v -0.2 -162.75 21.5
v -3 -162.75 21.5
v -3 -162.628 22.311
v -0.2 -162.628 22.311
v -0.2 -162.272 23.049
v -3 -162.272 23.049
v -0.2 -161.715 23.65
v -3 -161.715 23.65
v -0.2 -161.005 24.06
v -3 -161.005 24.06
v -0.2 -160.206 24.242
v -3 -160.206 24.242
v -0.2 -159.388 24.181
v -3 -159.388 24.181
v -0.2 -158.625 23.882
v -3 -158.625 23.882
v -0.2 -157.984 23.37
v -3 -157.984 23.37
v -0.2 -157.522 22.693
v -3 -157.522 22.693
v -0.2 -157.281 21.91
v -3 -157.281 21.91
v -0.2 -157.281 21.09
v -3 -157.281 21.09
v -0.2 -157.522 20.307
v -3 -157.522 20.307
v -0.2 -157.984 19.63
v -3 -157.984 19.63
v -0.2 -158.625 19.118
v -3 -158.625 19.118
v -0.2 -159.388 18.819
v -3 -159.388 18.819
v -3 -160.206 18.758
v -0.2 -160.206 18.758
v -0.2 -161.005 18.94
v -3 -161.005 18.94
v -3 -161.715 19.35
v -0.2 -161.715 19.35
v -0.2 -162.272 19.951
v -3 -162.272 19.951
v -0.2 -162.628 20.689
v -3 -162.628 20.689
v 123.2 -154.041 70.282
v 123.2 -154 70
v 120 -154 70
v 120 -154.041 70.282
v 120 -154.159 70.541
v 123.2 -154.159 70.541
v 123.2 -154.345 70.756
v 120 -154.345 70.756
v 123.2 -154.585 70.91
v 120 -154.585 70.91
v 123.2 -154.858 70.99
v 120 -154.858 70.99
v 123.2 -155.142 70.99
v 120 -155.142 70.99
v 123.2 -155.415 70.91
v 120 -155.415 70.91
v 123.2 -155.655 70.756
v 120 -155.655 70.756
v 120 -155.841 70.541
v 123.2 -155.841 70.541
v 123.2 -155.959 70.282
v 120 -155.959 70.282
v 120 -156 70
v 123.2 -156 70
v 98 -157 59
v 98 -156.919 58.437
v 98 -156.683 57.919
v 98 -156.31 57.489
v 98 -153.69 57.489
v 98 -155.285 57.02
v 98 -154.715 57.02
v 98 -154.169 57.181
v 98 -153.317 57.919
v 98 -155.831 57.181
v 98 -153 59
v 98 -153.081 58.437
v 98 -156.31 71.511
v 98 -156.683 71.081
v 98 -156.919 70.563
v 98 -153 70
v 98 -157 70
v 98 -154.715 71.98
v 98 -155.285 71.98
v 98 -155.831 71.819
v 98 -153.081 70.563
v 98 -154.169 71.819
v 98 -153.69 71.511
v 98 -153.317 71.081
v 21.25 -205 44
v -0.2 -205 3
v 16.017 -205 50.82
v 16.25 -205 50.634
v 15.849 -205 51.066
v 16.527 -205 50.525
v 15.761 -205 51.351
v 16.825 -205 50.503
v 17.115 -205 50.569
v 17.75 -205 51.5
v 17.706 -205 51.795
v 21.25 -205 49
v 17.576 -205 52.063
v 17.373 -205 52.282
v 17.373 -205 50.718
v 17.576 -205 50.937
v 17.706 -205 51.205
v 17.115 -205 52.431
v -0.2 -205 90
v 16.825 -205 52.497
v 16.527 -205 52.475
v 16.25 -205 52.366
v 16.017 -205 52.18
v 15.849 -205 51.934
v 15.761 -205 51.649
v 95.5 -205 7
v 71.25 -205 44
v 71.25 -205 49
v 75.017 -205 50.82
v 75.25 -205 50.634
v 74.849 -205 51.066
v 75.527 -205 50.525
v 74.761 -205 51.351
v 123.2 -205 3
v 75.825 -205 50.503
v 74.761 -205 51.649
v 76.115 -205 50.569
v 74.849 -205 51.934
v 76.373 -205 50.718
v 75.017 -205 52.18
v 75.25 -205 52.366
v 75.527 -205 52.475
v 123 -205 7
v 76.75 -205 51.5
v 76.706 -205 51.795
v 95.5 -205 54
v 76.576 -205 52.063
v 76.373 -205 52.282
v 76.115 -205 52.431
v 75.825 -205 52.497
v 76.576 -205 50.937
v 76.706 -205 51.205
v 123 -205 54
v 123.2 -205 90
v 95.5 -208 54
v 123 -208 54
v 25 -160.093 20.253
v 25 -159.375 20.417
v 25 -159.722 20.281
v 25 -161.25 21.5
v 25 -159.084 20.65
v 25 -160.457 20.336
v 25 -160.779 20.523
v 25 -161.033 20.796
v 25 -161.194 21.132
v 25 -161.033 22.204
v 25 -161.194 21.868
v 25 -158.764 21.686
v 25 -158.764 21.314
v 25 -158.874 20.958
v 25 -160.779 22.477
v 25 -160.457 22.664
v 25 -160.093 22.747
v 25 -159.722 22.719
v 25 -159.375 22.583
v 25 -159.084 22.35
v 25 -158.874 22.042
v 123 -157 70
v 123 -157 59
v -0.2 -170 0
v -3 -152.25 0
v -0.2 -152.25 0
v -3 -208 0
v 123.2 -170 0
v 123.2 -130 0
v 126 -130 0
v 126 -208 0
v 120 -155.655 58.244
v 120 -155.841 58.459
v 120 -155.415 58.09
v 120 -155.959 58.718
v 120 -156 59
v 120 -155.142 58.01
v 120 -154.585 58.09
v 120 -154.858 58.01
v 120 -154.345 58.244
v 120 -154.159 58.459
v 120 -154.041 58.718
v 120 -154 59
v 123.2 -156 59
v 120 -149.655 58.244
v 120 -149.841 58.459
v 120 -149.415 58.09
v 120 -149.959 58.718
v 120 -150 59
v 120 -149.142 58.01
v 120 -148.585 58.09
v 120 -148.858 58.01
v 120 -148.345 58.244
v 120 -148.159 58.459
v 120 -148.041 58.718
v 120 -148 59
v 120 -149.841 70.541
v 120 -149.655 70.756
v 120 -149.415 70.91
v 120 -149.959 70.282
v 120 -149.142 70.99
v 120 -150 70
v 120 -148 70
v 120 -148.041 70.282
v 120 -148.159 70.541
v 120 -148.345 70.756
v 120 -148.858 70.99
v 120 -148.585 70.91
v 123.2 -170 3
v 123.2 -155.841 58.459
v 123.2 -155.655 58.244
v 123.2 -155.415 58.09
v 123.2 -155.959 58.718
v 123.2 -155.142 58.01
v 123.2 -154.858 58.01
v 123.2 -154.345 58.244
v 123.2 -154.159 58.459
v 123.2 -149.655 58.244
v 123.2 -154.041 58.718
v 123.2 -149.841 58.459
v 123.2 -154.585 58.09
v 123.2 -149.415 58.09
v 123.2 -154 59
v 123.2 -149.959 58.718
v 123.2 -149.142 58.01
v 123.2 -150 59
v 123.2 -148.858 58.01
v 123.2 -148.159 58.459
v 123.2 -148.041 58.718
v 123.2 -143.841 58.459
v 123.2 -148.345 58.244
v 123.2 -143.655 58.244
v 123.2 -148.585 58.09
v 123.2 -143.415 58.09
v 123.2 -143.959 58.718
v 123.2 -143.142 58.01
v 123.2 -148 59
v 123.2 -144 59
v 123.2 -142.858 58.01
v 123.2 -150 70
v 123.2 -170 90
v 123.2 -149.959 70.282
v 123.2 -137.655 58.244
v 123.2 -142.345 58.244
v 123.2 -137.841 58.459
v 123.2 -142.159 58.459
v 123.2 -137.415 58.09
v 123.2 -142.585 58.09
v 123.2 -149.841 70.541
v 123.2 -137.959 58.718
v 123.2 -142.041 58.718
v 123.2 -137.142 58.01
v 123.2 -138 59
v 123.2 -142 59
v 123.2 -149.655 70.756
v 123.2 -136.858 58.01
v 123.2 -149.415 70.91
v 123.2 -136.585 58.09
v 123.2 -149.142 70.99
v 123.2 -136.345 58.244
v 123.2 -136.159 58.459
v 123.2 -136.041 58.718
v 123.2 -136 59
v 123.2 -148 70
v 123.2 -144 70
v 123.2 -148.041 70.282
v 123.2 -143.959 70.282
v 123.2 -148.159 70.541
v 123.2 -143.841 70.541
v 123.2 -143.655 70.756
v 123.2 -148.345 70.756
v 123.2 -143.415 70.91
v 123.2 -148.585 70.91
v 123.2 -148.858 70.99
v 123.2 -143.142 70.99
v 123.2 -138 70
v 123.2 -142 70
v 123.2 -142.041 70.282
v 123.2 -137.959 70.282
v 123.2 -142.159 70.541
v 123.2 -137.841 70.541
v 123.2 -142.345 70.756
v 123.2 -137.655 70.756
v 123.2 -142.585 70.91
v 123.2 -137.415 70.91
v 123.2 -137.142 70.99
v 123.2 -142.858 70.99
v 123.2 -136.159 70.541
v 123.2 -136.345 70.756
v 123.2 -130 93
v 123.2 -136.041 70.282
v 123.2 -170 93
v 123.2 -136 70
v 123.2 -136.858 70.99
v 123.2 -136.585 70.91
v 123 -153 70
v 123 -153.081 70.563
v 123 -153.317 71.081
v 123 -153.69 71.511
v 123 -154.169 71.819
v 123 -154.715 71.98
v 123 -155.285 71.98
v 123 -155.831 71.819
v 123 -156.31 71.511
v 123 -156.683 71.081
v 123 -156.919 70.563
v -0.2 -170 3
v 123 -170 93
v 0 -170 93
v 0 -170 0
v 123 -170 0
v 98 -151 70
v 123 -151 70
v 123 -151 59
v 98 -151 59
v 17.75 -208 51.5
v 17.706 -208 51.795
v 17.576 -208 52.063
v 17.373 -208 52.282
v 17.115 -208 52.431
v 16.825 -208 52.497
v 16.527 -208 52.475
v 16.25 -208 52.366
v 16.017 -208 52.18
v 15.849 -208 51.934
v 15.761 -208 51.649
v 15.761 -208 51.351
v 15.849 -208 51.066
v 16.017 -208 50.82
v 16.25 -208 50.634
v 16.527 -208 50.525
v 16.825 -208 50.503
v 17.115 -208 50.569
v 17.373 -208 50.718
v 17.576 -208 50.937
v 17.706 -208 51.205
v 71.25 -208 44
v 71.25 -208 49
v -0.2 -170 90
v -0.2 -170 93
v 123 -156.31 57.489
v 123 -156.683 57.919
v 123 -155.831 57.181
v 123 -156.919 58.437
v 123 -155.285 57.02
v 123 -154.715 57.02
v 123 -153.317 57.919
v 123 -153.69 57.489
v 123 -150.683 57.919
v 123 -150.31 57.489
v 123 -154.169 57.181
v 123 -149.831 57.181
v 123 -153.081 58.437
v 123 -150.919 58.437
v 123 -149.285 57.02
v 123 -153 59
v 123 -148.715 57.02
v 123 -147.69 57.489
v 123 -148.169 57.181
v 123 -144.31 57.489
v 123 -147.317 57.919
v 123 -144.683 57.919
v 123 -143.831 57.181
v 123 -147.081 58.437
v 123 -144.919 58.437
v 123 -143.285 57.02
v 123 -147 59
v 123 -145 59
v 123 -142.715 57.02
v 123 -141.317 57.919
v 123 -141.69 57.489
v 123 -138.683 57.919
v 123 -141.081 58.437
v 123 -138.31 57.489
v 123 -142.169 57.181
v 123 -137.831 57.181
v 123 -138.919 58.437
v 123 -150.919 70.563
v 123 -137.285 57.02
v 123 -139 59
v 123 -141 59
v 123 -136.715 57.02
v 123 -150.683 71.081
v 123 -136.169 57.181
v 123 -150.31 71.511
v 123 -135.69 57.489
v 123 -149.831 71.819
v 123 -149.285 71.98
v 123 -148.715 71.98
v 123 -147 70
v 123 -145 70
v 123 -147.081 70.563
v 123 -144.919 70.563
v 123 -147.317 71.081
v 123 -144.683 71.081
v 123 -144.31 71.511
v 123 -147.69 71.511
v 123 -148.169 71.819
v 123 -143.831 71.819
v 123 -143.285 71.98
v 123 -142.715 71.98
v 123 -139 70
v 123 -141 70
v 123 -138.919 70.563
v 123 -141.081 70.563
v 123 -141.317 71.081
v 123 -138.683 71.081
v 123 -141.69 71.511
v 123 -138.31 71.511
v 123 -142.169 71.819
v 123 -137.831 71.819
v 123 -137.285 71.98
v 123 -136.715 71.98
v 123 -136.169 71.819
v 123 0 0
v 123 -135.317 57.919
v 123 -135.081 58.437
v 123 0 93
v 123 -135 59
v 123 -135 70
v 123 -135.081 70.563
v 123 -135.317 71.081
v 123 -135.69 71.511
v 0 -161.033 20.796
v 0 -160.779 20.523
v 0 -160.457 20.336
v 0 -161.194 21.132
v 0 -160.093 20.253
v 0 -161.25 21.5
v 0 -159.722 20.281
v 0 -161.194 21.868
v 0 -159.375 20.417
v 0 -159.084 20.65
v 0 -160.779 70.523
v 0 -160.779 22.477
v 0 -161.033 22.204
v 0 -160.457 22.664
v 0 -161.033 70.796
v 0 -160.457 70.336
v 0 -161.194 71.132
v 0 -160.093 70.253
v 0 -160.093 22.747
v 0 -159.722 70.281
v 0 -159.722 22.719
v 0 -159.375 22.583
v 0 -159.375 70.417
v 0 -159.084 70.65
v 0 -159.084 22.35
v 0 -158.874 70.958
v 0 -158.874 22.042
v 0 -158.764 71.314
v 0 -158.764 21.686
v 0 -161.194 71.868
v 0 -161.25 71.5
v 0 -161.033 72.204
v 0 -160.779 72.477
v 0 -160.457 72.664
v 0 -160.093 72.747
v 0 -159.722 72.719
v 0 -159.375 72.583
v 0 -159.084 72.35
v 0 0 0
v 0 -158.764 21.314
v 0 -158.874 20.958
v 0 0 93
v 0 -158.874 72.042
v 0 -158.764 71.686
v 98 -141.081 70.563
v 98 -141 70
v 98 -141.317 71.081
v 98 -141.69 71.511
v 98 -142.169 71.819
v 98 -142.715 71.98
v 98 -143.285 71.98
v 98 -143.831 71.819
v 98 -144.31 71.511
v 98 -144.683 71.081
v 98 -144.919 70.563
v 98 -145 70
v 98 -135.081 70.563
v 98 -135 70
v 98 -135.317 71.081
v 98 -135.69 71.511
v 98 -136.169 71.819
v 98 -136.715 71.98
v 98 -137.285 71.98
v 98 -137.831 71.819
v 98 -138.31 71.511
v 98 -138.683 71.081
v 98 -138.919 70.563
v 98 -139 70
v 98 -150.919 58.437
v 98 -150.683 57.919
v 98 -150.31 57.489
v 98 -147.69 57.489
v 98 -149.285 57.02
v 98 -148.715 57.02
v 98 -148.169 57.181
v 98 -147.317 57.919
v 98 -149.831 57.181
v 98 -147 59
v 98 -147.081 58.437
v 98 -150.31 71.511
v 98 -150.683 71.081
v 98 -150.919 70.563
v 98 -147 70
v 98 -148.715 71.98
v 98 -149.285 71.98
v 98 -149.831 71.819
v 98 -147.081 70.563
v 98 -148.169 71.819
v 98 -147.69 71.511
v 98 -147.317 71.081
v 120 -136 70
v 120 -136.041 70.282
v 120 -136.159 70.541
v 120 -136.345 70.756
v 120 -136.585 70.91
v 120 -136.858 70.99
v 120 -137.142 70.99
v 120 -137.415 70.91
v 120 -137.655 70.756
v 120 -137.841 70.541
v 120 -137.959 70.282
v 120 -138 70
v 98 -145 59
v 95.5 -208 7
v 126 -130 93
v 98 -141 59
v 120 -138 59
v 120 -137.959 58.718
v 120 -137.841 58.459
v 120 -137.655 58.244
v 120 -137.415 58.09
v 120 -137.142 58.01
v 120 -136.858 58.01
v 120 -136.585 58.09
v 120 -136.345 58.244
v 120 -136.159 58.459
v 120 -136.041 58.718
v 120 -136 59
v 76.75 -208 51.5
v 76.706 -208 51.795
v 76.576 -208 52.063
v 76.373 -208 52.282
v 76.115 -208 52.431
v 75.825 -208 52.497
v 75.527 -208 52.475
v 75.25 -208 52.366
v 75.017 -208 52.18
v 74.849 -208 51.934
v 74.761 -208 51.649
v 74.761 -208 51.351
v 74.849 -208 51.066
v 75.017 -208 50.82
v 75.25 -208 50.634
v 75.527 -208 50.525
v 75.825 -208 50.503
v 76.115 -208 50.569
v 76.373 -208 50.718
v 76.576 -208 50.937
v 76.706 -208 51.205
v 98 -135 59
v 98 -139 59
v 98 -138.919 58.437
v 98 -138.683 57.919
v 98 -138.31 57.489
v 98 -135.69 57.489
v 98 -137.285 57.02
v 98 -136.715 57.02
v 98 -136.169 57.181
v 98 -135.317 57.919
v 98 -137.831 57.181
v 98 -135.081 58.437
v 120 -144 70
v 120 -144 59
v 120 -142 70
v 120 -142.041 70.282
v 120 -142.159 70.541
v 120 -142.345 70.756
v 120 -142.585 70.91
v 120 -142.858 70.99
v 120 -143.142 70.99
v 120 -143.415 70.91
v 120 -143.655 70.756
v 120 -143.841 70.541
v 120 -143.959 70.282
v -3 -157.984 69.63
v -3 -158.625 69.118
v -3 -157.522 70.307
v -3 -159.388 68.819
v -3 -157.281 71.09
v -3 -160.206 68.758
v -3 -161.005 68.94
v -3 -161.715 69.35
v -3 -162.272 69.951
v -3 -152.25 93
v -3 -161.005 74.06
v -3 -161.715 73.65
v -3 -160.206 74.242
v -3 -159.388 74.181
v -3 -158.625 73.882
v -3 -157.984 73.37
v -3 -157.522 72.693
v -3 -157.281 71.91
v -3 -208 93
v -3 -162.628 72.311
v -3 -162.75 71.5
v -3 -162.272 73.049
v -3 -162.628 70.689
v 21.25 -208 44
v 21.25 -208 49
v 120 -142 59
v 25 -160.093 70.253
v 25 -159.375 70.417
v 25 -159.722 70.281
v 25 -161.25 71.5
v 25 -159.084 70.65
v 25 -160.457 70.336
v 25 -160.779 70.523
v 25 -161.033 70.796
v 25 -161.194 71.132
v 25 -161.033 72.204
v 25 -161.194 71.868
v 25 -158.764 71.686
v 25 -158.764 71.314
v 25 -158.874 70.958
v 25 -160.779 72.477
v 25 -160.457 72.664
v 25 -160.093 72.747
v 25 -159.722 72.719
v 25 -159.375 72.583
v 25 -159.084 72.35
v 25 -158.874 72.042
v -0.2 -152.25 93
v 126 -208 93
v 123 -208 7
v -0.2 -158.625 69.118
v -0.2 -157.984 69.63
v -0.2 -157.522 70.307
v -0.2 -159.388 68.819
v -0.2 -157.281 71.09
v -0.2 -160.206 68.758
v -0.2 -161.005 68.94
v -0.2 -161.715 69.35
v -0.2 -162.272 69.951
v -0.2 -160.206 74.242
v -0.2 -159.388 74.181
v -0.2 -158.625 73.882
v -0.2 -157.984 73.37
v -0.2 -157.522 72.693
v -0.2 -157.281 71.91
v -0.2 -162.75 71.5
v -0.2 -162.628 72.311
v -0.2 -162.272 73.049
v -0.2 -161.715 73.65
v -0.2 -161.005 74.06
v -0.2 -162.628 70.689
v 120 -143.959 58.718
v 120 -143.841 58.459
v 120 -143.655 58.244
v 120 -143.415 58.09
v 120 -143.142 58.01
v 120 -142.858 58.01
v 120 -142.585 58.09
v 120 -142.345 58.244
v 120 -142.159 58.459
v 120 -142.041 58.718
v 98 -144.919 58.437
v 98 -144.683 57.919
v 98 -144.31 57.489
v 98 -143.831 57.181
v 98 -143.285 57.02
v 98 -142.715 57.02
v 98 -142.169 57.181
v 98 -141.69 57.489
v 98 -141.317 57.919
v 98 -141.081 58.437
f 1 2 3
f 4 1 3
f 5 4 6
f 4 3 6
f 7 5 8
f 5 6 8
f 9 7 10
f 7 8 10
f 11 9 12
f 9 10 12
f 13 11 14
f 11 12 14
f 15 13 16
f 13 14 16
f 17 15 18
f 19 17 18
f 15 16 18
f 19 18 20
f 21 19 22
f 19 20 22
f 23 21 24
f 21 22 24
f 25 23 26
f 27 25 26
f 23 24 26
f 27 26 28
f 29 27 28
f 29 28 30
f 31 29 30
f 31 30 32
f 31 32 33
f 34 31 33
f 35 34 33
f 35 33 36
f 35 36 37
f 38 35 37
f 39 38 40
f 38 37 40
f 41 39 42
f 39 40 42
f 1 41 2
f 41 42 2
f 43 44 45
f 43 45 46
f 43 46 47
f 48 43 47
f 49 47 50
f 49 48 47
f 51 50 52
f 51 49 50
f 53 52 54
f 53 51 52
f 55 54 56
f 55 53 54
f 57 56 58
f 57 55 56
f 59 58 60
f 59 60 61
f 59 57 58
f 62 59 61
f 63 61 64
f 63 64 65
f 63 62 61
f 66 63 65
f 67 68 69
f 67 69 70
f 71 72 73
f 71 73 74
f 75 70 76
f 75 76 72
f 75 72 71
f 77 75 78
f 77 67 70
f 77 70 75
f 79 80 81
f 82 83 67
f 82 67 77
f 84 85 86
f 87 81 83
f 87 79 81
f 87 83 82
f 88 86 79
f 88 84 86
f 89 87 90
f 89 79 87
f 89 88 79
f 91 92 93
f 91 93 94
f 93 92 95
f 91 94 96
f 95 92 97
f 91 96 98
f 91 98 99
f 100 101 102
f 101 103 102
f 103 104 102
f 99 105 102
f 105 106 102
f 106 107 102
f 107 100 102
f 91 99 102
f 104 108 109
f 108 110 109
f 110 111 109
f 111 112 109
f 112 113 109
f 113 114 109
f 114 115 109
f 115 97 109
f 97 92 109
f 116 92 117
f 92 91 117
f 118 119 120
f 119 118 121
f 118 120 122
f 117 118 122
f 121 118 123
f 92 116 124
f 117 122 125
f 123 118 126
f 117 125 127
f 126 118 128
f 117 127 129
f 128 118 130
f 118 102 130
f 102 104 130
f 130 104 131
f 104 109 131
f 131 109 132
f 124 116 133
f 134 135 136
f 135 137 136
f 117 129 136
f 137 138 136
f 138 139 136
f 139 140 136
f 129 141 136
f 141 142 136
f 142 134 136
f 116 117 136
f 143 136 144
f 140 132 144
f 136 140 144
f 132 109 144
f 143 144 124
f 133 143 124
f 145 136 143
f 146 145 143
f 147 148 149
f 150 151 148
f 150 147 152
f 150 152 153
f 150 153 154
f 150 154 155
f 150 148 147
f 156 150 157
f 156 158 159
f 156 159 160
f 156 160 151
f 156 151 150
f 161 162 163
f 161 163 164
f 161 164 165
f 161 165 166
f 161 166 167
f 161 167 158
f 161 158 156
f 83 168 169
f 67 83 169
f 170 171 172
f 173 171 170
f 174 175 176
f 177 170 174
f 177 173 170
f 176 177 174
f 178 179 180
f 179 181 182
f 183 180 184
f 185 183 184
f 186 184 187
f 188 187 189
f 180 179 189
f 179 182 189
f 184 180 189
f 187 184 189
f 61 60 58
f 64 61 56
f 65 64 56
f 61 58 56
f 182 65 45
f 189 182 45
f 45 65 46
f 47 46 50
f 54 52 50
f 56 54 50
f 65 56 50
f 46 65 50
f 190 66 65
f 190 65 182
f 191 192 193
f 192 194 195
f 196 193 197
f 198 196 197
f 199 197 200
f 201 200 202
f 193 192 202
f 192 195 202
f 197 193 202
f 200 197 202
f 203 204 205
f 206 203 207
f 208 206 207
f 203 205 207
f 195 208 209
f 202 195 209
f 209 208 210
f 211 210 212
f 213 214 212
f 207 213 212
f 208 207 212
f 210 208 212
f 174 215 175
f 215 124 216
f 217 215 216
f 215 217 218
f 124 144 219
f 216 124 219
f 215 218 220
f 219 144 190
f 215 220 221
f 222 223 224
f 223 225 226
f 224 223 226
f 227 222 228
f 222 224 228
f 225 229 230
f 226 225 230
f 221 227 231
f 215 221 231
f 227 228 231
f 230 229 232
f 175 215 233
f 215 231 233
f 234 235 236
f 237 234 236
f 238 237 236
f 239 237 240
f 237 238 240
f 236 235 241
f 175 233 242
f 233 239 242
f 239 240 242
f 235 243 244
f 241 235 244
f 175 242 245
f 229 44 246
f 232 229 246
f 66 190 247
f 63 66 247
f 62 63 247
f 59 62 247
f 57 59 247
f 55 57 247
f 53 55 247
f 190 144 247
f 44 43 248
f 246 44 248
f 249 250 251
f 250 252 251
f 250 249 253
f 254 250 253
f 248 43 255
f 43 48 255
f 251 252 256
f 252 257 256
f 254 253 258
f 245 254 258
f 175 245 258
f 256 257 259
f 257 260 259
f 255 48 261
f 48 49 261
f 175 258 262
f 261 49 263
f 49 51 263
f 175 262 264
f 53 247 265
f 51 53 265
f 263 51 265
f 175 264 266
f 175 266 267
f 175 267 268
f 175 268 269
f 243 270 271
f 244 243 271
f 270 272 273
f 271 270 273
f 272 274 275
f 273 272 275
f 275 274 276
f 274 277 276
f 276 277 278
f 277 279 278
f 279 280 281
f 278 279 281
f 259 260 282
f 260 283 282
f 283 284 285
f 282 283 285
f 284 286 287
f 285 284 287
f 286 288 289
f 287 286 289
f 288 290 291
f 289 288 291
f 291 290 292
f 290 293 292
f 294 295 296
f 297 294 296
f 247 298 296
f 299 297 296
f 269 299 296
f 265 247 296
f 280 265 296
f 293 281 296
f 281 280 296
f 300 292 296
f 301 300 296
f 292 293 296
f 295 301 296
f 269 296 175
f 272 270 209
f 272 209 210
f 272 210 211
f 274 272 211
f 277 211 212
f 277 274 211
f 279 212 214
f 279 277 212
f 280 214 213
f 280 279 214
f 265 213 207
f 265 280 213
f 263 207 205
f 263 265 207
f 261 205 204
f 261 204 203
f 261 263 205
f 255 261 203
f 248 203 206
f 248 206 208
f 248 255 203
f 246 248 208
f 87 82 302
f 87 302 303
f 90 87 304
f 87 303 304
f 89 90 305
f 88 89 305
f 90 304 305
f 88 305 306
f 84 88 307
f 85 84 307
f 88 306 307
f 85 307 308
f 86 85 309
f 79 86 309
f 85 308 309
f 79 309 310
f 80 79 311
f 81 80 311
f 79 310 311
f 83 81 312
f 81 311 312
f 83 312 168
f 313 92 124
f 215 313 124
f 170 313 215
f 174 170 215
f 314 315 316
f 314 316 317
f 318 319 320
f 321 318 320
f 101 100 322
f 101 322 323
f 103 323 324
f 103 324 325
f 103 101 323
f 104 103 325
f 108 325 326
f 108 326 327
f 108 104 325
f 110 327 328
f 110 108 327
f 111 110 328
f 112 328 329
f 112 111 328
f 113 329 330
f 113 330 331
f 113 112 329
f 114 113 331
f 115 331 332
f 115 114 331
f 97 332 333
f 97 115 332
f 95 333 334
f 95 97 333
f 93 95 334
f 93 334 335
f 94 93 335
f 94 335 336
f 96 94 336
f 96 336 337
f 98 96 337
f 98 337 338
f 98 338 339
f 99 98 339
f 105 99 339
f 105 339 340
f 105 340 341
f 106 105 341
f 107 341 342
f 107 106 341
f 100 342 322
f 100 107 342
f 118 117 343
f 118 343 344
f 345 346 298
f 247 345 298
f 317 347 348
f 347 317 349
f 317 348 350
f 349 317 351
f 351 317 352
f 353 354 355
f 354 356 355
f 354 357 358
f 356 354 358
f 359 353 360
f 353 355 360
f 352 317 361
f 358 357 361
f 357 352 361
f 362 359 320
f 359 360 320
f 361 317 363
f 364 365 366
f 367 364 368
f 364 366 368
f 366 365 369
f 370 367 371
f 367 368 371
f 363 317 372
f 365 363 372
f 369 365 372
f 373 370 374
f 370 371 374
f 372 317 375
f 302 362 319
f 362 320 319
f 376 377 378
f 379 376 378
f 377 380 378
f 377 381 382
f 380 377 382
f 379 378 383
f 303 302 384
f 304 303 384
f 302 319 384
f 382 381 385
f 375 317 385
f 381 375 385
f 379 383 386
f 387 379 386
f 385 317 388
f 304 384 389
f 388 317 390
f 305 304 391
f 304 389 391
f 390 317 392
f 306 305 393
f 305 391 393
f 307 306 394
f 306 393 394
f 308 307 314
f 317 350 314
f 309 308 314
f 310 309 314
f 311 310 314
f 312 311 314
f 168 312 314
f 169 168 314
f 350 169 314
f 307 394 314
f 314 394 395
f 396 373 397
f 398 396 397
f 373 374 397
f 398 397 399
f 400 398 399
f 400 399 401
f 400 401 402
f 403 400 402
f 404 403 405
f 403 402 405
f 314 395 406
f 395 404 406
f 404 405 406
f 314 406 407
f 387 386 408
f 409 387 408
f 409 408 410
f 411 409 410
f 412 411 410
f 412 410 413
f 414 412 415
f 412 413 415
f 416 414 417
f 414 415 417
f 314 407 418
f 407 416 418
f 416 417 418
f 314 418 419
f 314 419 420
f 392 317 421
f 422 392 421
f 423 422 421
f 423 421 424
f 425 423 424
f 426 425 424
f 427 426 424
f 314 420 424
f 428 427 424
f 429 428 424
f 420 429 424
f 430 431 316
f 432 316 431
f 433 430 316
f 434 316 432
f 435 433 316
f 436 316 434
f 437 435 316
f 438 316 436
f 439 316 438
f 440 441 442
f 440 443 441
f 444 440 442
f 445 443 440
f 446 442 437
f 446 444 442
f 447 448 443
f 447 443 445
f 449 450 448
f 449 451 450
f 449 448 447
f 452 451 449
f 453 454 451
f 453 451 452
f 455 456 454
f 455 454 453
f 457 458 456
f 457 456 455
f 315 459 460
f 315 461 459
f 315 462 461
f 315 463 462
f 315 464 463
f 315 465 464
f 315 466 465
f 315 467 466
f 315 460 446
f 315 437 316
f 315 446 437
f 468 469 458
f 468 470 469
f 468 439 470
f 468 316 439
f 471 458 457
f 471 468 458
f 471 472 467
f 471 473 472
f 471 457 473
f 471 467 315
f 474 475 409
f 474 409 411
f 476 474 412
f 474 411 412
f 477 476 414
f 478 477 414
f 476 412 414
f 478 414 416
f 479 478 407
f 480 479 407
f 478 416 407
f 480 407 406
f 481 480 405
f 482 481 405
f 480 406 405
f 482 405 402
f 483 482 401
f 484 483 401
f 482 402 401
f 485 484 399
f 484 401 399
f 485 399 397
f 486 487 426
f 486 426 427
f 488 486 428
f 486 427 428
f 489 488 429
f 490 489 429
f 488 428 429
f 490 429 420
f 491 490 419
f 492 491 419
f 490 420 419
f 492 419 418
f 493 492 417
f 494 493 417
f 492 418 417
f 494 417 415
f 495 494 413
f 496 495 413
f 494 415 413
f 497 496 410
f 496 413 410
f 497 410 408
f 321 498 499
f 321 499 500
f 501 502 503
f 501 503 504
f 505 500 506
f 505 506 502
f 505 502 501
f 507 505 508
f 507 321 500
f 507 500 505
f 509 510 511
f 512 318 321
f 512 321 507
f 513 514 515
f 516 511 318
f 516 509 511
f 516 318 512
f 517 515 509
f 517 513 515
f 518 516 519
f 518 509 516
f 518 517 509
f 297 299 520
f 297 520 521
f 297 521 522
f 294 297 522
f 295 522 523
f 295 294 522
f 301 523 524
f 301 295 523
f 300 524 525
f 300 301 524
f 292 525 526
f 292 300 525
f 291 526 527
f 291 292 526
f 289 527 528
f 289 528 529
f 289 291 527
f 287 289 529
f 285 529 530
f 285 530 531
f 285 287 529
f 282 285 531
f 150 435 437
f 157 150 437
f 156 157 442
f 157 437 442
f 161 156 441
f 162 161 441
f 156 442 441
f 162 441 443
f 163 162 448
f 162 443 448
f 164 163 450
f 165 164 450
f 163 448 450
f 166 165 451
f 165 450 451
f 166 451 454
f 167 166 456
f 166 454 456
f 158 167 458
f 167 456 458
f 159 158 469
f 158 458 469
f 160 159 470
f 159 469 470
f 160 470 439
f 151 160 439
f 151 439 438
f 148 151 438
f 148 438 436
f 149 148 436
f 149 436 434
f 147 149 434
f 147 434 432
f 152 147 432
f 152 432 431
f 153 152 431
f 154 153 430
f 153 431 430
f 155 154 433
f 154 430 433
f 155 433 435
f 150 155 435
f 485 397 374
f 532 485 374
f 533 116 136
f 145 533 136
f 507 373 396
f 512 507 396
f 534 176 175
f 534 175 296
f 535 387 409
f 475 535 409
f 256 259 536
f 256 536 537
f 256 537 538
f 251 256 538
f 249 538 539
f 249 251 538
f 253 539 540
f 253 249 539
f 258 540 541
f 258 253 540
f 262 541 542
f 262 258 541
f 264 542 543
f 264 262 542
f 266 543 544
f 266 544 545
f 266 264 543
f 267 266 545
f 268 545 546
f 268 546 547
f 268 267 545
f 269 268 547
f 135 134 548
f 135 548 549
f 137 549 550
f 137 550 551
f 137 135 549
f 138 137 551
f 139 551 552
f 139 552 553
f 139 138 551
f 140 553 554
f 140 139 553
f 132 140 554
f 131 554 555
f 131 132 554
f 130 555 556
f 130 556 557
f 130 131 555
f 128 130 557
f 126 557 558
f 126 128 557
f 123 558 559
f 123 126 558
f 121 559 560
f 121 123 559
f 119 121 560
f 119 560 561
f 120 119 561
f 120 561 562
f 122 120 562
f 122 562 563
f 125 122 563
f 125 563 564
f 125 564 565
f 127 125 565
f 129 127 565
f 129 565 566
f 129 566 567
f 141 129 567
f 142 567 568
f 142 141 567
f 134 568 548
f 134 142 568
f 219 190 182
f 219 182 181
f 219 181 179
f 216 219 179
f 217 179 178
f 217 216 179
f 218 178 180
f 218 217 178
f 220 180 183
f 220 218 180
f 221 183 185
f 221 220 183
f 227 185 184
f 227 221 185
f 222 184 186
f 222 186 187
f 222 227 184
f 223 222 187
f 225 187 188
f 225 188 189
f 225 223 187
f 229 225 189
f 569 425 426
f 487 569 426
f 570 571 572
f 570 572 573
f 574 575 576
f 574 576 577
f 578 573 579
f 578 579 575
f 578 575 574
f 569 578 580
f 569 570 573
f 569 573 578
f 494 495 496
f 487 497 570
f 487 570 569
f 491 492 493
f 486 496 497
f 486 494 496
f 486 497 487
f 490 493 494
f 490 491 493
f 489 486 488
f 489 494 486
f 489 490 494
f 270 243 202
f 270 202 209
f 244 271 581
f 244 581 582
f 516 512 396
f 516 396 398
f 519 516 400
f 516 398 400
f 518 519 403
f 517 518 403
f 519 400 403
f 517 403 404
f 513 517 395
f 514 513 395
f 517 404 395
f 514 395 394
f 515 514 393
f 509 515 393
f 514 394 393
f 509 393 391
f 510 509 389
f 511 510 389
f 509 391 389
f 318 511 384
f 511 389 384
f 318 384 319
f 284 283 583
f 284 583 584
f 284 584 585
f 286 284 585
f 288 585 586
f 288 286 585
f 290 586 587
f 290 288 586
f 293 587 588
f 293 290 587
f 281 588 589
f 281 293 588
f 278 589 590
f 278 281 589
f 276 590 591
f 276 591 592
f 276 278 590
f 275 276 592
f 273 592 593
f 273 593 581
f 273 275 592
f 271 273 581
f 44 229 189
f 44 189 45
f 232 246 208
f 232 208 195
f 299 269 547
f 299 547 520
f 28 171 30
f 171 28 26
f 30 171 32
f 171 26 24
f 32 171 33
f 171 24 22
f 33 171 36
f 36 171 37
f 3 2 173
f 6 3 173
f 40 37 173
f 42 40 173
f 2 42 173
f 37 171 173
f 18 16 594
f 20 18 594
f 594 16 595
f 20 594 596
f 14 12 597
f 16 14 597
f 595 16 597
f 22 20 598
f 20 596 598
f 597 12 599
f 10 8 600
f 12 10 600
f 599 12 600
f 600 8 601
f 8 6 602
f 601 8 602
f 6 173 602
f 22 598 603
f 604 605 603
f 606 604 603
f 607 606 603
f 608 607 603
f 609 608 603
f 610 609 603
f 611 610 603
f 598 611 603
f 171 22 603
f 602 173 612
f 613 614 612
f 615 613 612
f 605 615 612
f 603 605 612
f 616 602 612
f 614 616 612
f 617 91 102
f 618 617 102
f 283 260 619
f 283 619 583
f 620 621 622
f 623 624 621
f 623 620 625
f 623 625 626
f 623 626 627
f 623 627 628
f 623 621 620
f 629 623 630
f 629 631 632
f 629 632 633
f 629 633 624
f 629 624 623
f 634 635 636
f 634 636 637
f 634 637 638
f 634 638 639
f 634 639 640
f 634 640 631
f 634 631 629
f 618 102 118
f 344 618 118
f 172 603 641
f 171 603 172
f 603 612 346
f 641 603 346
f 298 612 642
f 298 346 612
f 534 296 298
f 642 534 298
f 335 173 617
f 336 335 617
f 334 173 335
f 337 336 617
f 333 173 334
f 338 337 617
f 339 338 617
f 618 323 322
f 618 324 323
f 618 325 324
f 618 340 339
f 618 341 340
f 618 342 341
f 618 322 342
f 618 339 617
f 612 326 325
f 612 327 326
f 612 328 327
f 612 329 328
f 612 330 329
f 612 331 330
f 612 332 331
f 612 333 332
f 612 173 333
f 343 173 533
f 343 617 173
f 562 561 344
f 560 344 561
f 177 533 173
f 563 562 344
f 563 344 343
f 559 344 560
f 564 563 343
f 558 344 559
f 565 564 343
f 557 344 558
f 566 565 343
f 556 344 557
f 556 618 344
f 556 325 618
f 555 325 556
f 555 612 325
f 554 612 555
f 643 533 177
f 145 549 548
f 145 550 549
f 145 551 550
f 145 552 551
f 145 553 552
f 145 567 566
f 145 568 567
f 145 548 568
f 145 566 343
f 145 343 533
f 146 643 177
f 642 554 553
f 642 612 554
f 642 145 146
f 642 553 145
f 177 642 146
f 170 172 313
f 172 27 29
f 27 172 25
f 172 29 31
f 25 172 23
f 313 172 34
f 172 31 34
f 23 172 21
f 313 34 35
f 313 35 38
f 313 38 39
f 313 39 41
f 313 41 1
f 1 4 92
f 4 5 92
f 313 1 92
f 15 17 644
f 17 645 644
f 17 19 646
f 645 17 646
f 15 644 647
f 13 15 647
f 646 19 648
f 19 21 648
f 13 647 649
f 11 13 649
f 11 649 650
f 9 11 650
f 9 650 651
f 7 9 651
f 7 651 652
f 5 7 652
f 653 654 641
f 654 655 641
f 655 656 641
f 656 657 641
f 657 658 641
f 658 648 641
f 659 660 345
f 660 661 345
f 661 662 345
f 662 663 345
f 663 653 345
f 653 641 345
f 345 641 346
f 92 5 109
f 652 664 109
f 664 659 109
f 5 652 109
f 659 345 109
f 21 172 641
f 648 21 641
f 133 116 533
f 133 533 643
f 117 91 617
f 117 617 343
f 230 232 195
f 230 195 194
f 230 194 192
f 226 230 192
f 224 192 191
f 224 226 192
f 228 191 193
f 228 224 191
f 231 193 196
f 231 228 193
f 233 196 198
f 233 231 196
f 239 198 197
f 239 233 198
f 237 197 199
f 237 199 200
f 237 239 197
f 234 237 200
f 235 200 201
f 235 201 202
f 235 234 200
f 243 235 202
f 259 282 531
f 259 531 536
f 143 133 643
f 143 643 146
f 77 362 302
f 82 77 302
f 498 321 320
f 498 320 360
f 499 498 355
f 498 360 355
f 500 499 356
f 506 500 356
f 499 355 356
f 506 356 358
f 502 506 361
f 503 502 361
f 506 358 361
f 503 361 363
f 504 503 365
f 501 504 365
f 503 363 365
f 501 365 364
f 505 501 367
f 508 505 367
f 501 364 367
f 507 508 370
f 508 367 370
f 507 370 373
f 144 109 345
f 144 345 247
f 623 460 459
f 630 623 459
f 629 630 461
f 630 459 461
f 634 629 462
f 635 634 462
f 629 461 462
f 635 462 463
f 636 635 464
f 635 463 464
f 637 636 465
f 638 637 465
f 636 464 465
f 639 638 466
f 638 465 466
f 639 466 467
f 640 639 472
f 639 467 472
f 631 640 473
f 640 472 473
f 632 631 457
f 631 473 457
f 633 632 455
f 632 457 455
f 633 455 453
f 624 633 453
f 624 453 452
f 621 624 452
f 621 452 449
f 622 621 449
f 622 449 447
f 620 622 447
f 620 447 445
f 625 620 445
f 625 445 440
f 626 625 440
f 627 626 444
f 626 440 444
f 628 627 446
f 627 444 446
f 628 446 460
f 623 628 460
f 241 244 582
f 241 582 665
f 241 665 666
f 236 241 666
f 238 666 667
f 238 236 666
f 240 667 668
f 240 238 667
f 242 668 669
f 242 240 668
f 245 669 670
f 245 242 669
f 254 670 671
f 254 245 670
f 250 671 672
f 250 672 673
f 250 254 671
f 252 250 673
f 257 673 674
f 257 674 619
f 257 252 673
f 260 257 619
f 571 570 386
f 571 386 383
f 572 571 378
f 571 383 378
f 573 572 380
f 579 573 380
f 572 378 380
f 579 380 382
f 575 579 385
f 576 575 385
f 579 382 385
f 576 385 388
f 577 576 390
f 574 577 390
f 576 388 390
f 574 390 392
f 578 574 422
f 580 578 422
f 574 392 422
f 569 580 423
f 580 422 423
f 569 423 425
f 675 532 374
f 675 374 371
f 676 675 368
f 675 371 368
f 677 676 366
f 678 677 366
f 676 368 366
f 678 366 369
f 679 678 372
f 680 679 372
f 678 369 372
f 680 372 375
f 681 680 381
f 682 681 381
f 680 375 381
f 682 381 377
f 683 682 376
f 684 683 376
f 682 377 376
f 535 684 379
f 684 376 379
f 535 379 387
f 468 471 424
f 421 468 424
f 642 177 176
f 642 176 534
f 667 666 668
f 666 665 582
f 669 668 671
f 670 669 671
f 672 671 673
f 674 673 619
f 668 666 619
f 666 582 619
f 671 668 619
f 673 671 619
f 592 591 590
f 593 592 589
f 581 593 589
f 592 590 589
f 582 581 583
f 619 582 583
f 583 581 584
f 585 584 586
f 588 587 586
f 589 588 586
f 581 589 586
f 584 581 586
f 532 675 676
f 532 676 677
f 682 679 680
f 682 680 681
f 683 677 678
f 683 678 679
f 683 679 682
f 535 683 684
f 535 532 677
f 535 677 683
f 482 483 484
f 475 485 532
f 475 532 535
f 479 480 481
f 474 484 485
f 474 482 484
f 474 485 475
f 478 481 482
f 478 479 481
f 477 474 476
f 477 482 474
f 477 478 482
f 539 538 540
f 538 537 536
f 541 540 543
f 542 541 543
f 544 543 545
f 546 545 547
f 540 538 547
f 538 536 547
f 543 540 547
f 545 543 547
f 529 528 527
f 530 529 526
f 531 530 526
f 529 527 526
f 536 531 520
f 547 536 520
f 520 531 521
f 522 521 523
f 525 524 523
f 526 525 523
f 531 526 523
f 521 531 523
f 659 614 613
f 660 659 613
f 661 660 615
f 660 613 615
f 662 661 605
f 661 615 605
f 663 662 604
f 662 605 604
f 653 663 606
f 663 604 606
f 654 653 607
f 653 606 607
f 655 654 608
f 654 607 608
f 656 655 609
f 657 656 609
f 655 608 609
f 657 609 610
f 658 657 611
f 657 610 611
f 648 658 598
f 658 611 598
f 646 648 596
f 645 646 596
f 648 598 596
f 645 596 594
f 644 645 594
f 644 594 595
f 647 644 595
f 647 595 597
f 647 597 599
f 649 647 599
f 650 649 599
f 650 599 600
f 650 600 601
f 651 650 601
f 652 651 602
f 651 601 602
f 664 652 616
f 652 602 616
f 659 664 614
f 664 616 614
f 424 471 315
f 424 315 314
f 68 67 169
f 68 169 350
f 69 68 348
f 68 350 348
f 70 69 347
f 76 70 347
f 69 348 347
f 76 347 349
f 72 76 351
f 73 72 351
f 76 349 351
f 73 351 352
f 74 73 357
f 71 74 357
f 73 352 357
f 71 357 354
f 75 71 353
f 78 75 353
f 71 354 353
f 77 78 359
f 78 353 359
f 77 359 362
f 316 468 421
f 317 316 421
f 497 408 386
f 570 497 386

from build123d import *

# Parameters (mm, degrees)
F2_W      = 123
F2_H      = 93
F3_DEPTH  = 170
F4_R      = 1.25
F5_DEPTH  = 25
F7_DEPTH  = 25
F9_W      = 129
F9_H      = 3
F9_H_2    = 87
F9_W_2    = 27.5
F9_H_3    = 47
F9_R      = 1
F9_W_3    = 50
F9_H_4    = 5
F10_DEPTH = 3
F11_DEPTH = 35
F12_R     = 2.75
F14_DEPTH = 2.8
F17_DEPTH = 2.8
F18_DEPTH = 6


with BuildPart() as f3:
    # F2 (on Front) → F3 (new body)
    with BuildSketch(Plane.XZ):
        with Locations((61.5, 46.5)):
            Rectangle(F2_W, F2_H)
    extrude(amount=F3_DEPTH)

    # F4 (on face) → F5 (cut)
    with BuildSketch(Plane(origin=(0, 0, 0), x_dir=(0, -1, 0), z_dir=(-1, 0, 0))):
        with Locations((160, 71.5)):
            Circle(F4_R)
        with Locations((160, 21.5)):
            Circle(F4_R)
    extrude(amount=-F5_DEPTH, mode=Mode.SUBTRACT)

    # F6 (on face) → F7 (cut)
    with BuildSketch(Plane.YZ.offset(123)):
        with BuildLine():
            ThreePointArc((-153, 70), (-155, 72), (-157, 70))
            Line((-157, 70), (-157, 59))
            ThreePointArc((-157, 59), (-155, 57), (-153, 59))
            Line((-153, 59), (-153, 70))
        make_face()
        with BuildLine():
            Line((-147, 59), (-147, 70))
            ThreePointArc((-147, 70), (-149, 72), (-151, 70))
            Line((-151, 70), (-151, 59))
            ThreePointArc((-151, 59), (-149, 57), (-147, 59))
        make_face()
        with BuildLine():
            Line((-141, 59), (-141, 70))
            ThreePointArc((-141, 70), (-143, 72), (-145, 70))
            Line((-145, 70), (-145, 59))
            ThreePointArc((-145, 59), (-143, 57), (-141, 59))
        make_face()
        with BuildLine():
            Line((-135, 59), (-135, 70))
            ThreePointArc((-135, 70), (-137, 72), (-139, 70))
            Line((-139, 70), (-139, 59))
            ThreePointArc((-139, 59), (-137, 57), (-135, 59))
        make_face()
    extrude(amount=-F7_DEPTH, mode=Mode.SUBTRACT)


with BuildPart() as f10:
    # F9 (on offset) → F10 (new body)
    with BuildSketch(Plane.XZ.offset(205)):
        with Locations((61.5, 1.5)):
            Rectangle(F9_W, F9_H)
        with Locations((61.5, 46.5)):
            Rectangle(F9_W, F9_H_2)
        with Locations((109.25, 30.5)):
            Rectangle(F9_W_2, F9_H_3, mode=Mode.SUBTRACT)
        with Locations((16.75, 51.5)):
            Circle(F9_R, mode=Mode.SUBTRACT)
        with Locations((46.25, 46.5)):
            Rectangle(F9_W_3, F9_H_4, mode=Mode.SUBTRACT)
        with Locations((75.75, 51.5)):
            Circle(F9_R, mode=Mode.SUBTRACT)
        with Locations((61.5, 91.5)):
            Rectangle(F9_W, F9_H)
    extrude(amount=F10_DEPTH)



with BuildPart() as f11:
    # F9 (on offset) → F11 (new body, through all)
    with BuildSketch(Plane.XZ.offset(205)):
        with Locations((61.5, 91.5)):
            Rectangle(F9_W, F9_H)
        with Locations((61.5, 1.5)):
            Rectangle(F9_W, F9_H)
    extrude(amount=-F11_DEPTH)


with BuildPart() as f10_1:
    add(f10.part)

    add(f11.part)  # F14 merges F11
    # F12 (on face) → F14 (join, through all)
    with BuildSketch(Plane(origin=(-3, 0, 0), x_dir=(0, -1, 0), z_dir=(-1, 0, 0))):
        Polygon((208, 0), (208, 93), (170, 93), (152.25, 93), (152.25, 0), align=None)
        with Locations((160, 21.5)):
            Circle(F12_R, mode=Mode.SUBTRACT)
        with Locations((160, 71.5)):
            Circle(F12_R, mode=Mode.SUBTRACT)
    extrude(amount=-F14_DEPTH)

    # F15 (on face) → F17 (join, through all)
    with BuildSketch(Plane.YZ.offset(126)):
        Polygon((-170, 93), (-208, 93), (-208, 0), (-130, 0), (-130, 93), align=None)
        with BuildLine():
            Line((-156, 59), (-156, 70))
            ThreePointArc((-156, 70), (-155, 71), (-154, 70))
            Line((-154, 70), (-154, 59))
            ThreePointArc((-154, 59), (-155, 58), (-156, 59))
        make_face(mode=Mode.SUBTRACT)
        with BuildLine():
            Line((-150, 59), (-150, 70))
            ThreePointArc((-150, 70), (-149, 71), (-148, 70))
            Line((-148, 70), (-148, 59))
            ThreePointArc((-148, 59), (-149, 58), (-150, 59))
        make_face(mode=Mode.SUBTRACT)
        with BuildLine():
            Line((-144, 59), (-144, 70))
            ThreePointArc((-144, 70), (-143, 71), (-142, 70))
            Line((-142, 70), (-142, 59))
            ThreePointArc((-142, 59), (-143, 58), (-144, 59))
        make_face(mode=Mode.SUBTRACT)
        with BuildLine():
            Line((-138, 59), (-138, 70))
            ThreePointArc((-138, 70), (-137, 71), (-136, 70))
            Line((-136, 70), (-136, 59))
            ThreePointArc((-136, 59), (-137, 58), (-138, 59))
        make_face(mode=Mode.SUBTRACT)
    extrude(amount=-F17_DEPTH)

    # F15 (on face) → F18 (join)
    with BuildSketch(Plane.YZ.offset(126)):
        with BuildLine():
            ThreePointArc((-154, 70), (-155, 71), (-156, 70))
            Line((-156, 70), (-156, 59))
            ThreePointArc((-156, 59), (-155, 58), (-154, 59))
            Line((-154, 59), (-154, 70))
        make_face()
        with BuildLine():
            ThreePointArc((-148, 70), (-149, 71), (-150, 70))
            Line((-150, 70), (-150, 59))
            ThreePointArc((-150, 59), (-149, 58), (-148, 59))
            Line((-148, 59), (-148, 70))
        make_face()
        with BuildLine():
            ThreePointArc((-142, 70), (-143, 71), (-144, 70))
            Line((-144, 70), (-144, 59))
            ThreePointArc((-144, 59), (-143, 58), (-142, 59))
            Line((-142, 59), (-142, 70))
        make_face()
        with BuildLine():
            ThreePointArc((-136, 70), (-137, 71), (-138, 70))
            Line((-138, 70), (-138, 59))
            ThreePointArc((-138, 59), (-137, 58), (-136, 59))
            Line((-136, 59), (-136, 70))
        make_face()
    extrude(amount=-F18_DEPTH)


solid = Compound([f3.part, f10_1.part])
